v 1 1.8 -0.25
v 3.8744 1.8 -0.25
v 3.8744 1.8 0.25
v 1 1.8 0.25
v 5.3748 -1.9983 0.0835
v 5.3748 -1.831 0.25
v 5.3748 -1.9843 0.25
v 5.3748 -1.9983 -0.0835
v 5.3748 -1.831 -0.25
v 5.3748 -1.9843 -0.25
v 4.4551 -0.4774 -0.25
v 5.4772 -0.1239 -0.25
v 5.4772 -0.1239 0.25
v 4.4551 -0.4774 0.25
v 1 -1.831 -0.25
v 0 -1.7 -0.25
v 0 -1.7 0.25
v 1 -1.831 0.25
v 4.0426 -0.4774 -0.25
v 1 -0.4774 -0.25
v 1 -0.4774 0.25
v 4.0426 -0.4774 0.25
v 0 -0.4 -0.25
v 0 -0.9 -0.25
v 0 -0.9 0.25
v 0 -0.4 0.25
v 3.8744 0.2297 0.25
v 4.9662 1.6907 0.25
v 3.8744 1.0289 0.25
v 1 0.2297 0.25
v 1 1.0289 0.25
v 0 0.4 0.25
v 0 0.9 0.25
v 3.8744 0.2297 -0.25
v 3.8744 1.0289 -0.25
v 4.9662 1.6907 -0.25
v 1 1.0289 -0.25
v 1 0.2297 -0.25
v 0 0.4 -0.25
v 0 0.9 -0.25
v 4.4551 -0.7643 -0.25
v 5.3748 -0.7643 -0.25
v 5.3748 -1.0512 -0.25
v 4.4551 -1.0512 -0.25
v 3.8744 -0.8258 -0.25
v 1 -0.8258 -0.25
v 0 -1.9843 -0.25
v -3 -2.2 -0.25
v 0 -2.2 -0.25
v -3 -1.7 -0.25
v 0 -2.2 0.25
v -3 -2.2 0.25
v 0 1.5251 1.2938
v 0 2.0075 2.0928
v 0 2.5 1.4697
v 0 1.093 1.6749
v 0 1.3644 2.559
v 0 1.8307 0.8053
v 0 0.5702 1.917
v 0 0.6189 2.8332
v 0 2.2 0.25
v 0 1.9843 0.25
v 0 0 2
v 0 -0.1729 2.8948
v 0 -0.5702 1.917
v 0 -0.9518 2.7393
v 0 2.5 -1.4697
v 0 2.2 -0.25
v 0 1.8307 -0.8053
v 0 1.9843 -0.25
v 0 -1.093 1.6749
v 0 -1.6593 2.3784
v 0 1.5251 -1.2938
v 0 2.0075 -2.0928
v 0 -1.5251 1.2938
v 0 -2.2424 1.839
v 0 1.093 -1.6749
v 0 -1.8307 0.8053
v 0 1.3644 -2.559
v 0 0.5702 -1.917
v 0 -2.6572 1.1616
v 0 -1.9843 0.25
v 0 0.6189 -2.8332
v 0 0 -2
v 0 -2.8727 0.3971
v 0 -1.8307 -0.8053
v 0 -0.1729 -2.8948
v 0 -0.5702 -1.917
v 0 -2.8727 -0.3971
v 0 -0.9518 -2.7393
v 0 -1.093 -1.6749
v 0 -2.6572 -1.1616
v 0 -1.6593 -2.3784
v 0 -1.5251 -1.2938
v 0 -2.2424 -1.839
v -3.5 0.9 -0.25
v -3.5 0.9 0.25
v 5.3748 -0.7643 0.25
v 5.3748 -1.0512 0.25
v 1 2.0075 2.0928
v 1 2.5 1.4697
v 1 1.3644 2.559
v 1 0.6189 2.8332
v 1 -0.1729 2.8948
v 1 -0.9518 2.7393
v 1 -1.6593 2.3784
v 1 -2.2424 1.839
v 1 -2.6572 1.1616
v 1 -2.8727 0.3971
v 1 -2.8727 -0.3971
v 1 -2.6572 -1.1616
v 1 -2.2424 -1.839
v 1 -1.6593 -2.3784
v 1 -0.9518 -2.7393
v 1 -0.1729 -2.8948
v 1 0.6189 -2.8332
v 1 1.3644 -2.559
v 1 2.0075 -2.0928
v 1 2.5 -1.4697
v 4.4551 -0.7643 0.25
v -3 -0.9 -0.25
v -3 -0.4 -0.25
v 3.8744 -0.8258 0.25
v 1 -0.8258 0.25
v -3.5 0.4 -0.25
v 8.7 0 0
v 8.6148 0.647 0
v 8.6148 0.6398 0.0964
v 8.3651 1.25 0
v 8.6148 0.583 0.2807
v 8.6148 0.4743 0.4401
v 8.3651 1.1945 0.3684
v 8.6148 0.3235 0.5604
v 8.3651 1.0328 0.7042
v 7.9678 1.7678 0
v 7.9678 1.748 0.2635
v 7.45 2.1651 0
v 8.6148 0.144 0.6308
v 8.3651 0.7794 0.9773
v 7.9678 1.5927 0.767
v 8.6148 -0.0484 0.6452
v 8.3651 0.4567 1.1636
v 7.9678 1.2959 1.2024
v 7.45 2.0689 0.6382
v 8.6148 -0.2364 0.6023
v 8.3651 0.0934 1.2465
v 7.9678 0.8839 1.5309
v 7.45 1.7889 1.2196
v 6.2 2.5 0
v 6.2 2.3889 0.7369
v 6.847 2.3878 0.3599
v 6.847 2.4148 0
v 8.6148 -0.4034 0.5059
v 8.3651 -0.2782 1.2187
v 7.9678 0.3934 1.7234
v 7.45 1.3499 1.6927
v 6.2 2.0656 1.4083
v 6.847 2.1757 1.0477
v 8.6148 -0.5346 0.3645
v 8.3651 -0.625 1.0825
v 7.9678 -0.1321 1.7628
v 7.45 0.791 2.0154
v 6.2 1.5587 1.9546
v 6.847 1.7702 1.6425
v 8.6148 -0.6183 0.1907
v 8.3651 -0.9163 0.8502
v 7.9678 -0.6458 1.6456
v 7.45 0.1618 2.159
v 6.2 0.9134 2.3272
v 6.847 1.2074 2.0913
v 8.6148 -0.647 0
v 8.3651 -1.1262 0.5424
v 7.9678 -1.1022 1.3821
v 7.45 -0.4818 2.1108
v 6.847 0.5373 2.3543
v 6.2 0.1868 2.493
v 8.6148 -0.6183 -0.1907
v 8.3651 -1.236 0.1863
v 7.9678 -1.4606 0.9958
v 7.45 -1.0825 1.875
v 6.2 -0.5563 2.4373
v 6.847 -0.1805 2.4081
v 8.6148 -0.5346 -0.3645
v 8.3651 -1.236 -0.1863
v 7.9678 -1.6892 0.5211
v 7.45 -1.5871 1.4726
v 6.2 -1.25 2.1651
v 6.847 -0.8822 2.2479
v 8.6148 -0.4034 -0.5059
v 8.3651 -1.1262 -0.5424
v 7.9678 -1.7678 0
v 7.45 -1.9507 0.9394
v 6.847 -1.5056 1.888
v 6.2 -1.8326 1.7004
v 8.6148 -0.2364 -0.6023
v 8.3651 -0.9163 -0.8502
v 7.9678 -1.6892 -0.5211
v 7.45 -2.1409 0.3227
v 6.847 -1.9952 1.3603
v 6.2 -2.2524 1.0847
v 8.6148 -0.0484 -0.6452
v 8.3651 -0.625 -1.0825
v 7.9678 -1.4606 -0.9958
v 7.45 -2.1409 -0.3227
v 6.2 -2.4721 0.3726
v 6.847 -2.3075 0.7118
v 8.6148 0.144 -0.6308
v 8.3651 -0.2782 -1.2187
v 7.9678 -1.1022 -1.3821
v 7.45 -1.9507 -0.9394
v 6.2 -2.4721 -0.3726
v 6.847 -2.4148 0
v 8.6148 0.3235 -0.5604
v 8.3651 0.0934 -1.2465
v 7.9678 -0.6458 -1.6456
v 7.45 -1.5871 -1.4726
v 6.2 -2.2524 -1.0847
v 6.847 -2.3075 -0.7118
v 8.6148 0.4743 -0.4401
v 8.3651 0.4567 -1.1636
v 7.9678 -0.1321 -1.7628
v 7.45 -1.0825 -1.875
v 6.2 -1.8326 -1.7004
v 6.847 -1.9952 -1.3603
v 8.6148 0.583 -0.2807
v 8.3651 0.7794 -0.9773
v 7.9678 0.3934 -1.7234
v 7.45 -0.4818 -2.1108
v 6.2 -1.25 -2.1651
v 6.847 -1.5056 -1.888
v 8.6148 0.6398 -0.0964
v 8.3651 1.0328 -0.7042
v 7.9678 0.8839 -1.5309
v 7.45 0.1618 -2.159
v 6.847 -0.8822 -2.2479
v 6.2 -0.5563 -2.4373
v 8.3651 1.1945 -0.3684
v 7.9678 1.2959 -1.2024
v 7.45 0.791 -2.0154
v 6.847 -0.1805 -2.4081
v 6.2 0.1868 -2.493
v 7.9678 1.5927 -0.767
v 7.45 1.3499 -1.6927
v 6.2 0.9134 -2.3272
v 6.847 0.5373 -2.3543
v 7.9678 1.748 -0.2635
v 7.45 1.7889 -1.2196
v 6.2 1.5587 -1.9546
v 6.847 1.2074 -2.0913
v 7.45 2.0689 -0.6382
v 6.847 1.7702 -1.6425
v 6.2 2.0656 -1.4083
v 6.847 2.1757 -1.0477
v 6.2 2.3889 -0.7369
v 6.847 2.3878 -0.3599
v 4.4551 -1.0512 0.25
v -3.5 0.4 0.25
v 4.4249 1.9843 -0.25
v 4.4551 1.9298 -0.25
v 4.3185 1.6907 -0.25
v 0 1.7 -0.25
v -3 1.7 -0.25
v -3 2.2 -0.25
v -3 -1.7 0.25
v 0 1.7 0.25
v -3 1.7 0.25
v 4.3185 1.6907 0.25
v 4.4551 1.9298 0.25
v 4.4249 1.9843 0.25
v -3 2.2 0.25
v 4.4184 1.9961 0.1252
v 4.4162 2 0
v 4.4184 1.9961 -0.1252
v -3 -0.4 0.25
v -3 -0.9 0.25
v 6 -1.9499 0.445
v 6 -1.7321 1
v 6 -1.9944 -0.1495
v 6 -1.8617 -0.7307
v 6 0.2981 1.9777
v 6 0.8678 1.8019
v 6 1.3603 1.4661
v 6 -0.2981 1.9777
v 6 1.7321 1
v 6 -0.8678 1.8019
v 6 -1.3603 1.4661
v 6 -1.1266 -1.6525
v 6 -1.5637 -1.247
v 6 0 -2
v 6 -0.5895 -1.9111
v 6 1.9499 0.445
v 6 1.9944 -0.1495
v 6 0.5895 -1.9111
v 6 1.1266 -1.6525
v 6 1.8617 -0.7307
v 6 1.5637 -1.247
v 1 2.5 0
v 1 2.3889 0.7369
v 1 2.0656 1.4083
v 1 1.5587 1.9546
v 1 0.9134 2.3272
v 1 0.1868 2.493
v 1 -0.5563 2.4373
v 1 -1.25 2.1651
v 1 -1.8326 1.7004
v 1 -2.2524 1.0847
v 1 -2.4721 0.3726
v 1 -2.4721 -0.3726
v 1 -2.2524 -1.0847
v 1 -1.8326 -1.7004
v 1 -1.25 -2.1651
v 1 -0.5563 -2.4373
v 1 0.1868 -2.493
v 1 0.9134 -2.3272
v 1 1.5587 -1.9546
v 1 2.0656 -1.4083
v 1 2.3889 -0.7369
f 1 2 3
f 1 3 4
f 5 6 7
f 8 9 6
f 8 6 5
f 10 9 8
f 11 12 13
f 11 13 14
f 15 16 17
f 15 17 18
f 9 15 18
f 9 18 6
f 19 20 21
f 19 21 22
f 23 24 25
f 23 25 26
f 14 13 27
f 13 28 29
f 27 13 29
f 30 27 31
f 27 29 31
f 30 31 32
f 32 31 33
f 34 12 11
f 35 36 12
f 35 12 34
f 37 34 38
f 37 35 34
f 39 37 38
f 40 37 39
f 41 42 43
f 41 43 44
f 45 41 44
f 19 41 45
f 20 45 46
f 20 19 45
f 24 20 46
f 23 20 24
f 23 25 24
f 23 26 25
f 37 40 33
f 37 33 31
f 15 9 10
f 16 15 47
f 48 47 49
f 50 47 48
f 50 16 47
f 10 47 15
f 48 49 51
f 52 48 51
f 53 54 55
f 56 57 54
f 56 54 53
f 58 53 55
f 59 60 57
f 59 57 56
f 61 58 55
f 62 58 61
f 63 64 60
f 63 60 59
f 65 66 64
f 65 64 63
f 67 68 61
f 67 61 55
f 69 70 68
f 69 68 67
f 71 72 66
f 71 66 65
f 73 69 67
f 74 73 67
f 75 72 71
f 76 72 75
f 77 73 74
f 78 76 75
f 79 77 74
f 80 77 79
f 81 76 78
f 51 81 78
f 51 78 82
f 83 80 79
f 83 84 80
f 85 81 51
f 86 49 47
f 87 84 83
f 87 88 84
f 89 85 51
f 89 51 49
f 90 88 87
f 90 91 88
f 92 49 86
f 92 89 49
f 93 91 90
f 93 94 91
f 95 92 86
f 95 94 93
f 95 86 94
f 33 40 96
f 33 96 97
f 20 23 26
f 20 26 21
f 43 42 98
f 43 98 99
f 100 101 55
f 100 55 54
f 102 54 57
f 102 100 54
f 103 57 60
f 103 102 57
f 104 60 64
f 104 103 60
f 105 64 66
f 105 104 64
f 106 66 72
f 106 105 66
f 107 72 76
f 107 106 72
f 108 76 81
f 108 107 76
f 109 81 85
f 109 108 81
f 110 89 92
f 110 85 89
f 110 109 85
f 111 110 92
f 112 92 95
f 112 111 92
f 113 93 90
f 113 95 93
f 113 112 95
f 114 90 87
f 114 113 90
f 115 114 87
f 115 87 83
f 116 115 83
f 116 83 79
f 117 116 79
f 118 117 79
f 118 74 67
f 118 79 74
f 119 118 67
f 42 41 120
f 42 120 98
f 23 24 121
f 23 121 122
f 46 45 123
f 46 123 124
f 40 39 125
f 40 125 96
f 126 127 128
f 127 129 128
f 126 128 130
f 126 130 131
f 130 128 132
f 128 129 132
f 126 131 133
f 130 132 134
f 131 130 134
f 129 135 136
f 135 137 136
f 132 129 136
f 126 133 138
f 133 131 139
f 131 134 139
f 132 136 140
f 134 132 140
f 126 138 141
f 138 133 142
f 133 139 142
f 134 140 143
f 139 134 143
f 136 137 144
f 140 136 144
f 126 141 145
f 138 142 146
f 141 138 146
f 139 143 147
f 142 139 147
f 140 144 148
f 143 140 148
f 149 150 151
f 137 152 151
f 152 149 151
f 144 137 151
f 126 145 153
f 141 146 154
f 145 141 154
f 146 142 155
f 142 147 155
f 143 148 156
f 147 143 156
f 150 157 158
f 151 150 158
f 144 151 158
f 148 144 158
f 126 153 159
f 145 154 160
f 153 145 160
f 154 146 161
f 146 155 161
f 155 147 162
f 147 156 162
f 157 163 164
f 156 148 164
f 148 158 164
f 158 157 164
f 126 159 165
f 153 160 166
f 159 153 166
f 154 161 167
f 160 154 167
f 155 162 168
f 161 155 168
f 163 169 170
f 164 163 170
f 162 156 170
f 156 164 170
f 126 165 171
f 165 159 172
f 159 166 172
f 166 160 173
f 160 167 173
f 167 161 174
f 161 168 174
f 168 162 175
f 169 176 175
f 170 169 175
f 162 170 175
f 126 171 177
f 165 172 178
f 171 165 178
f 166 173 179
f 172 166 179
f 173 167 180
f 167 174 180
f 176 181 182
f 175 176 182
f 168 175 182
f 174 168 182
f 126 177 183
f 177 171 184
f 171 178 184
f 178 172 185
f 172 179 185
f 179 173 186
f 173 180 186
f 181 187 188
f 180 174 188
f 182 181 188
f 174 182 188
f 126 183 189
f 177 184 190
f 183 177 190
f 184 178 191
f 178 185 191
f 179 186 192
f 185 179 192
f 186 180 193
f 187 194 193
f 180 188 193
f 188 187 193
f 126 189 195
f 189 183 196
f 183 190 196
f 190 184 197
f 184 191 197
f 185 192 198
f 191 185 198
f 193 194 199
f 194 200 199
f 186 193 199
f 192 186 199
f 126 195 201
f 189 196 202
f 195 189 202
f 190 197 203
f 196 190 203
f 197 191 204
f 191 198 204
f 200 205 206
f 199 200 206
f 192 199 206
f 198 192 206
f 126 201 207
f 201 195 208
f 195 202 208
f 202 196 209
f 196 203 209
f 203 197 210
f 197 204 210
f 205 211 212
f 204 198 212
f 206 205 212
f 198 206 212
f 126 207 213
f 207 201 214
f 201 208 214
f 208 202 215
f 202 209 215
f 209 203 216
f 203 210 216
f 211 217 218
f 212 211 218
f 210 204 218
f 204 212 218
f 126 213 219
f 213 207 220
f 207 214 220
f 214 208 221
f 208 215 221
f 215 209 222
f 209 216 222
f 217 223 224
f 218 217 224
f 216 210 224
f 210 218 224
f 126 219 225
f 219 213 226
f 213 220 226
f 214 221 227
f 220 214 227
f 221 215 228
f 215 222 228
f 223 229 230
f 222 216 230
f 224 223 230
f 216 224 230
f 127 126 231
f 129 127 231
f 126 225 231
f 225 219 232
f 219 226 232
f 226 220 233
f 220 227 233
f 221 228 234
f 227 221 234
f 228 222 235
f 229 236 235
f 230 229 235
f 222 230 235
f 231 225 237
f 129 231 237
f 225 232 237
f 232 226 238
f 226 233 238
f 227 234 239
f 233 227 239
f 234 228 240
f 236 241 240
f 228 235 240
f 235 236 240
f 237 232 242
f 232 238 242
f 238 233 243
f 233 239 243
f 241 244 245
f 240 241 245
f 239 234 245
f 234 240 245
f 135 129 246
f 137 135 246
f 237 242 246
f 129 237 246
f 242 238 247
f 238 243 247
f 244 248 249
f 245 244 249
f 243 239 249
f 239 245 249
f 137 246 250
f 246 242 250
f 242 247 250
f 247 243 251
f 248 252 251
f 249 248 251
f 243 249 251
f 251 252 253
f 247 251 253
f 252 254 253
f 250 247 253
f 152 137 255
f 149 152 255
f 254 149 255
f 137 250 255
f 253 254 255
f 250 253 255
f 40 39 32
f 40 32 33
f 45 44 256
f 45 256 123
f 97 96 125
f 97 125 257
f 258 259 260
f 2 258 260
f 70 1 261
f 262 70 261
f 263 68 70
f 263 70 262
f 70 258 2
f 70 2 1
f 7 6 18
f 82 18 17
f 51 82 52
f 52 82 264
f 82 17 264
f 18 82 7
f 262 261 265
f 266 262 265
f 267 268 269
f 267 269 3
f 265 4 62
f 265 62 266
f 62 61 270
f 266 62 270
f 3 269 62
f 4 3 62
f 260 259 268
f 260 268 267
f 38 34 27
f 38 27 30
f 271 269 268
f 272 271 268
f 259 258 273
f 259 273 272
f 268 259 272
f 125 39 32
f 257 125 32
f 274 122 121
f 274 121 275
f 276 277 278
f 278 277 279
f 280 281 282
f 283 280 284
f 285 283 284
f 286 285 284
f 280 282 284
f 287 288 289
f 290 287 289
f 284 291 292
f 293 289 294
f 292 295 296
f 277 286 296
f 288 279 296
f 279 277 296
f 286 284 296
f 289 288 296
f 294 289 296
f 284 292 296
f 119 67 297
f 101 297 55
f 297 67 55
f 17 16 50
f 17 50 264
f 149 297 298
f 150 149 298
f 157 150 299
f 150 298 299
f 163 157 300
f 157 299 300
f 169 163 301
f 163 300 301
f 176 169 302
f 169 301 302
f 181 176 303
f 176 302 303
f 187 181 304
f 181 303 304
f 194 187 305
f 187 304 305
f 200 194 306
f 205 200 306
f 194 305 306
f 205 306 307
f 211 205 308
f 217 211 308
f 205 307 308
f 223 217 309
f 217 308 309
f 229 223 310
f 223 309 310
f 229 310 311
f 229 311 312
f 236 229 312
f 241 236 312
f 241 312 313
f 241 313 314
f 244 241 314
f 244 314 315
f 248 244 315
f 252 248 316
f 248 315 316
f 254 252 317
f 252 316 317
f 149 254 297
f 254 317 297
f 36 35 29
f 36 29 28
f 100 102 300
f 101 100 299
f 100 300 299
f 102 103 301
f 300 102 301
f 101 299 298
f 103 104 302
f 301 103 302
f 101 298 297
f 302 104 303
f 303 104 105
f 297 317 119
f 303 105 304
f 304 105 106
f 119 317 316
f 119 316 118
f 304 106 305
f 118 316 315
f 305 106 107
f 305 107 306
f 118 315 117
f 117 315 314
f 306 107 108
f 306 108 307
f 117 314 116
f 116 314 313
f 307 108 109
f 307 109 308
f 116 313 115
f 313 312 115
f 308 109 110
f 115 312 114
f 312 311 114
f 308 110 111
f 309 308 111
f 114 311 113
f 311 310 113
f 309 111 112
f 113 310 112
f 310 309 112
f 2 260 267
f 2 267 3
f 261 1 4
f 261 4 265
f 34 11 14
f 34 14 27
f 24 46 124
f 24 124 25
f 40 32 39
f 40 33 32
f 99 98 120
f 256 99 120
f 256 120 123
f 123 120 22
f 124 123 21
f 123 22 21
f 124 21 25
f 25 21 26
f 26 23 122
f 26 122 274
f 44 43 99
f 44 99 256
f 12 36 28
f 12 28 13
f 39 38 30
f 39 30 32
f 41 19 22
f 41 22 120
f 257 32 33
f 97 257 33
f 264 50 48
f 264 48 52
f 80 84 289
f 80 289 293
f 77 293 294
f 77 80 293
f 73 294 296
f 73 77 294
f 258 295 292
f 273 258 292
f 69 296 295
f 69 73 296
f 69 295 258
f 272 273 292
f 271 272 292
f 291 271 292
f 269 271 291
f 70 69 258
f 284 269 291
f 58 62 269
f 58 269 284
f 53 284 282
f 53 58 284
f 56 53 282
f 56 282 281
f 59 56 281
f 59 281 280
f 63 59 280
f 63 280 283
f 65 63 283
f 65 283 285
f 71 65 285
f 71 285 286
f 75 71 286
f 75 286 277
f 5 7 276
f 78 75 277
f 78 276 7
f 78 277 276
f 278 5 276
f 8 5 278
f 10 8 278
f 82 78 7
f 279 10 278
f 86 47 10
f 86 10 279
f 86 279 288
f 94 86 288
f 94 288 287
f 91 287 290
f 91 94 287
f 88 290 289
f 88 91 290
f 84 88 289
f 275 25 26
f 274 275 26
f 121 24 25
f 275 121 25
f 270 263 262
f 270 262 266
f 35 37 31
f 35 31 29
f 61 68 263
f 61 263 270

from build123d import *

# Parameters (mm, degrees)
SKETCH_3_W               = 1
SKETCH_3_H               = 2.9
CUT_EXTRUDE_1_DEPTH      = 10
SKETCH_5_W               = 0.5
SKETCH_5_H               = 0.5
EXTRUDE_1_DEPTH          = 3
SKETCH_5_3_W             = 0.5
SKETCH_5_3_H             = 0.5
EXTRUDE_2_DEPTH          = 3.5
CUT_EXTRUDE_2_DEPTH      = 5
CUT_EXTRUDE_2_DEPTH_BACK = 1
SKETCH_7_R               = 2
EXTRUDE_3_DEPTH          = 0.25
EXTRUDE_3_DEPTH_BACK     = 0.25


with BuildPart() as part:
    # 草图1 → 旋转1 (revolve)
    with BuildSketch(Plane.XY):
        with BuildLine():
            Line((0, 0), (8.7, 0))
            ThreePointArc((8.7, 0), (7.967766953, 1.767766953), (6.2, 2.5))
            Line((6.2, 2.5), (0, 2.5))
            Line((0, 2.5), (0, 0))
        make_face()
    revolve(axis=Axis((0, 0, 0), (1, 0, 0)))

    # 草图3 → 旋转2 (revolve)
    with BuildSketch(Plane.XY, mode=Mode.PRIVATE) as revolve_2_sk:
        with Locations((0.5, 1.45)):
            Rectangle(SKETCH_3_W, SKETCH_3_H)
    revolve(revolve_2_sk.sketch.rotate(Axis((0, 0, 0), (1, 0, 0)), 90), axis=Axis((0, 0, 0), (1, 0, 0)))

    # 草图4 → 切除-拉伸1 (cut)
    with BuildSketch(Plane.ZY):
        with BuildLine():
            Line((-1.469693846, 2.5), (1.469693846, 2.5))
            ThreePointArc((1.469693846, 2.5), (0, 2.9), (-1.469693846, 2.5))
        make_face()
    extrude(amount=-CUT_EXTRUDE_1_DEPTH, mode=Mode.SUBTRACT)

    # 草图5 → 凸台-拉伸1 (add)
    with BuildSketch(Plane.ZY):
        with Locations((0, 1.95)):
            Rectangle(SKETCH_5_W, SKETCH_5_H)
        with Locations((0, -0.65)):
            Rectangle(SKETCH_5_W, SKETCH_5_H)
        with Locations((0, -1.95)):
            Rectangle(SKETCH_5_W, SKETCH_5_H)
    extrude(amount=EXTRUDE_1_DEPTH)

    # 草图5<3> → 凸台-拉伸2 (add)
    with BuildSketch(Plane.ZY):
        with Locations((0, 0.65)):
            Rectangle(SKETCH_5_3_W, SKETCH_5_3_H)
    extrude(amount=EXTRUDE_2_DEPTH)

    # 草图7 → 切除-拉伸2 (cut, two sides: drawn at the far end of the back side and taken through both)
    with BuildSketch(Plane(origin=(1, 0, 0), x_dir=(0, 0, -1), z_dir=(1, 0, 0)).offset(-CUT_EXTRUDE_2_DEPTH_BACK)):
        Circle(SKETCH_7_R)
    extrude(amount=CUT_EXTRUDE_2_DEPTH + CUT_EXTRUDE_2_DEPTH_BACK, mode=Mode.SUBTRACT)


with BuildPart() as cut_extrude_2_piece_1:
    # of the separate pieces the step leaves, piece 1, a body of its own (cut_extrude_2_pieces)
    add(part.part.solids().sort_by_distance((8.7, 0, 0))[0])

    # 草图6 → 凸台-拉伸3 (add, two sides: drawn at the far end of the back side and taken through both)
    with BuildSketch(Plane.XY.offset(-EXTRUDE_3_DEPTH_BACK)):
        Polygon((1, 2.2), (3.977000914, 2.2), (4.190377097, 2.408020966), (4.455092421, 1.929825542), (4.318465157, 1.69072783), (3.874426549, 1.8), (1, 1.8), (0, 1.7), (0, 2.2), align=None)
        Polygon((1, 1.02893952), (3.874426549, 1.02893952), (4.96616378, 1.69072783), (5.47723514, -0.12385302), (4.455092421, -0.477376065), (3.874426549, 0.229670026), (1, 0.229670026), (0, 0.4), (0, 0.9), align=None)
        Polygon((1, -0.477376065), (4.042648868, -0.477376065), (4.455092421, -0.76429332), (5.374764692, -0.76429332), (5.374764692, -1.051210574), (4.455092421, -1.051210574), (3.874426549, -0.825775589), (1, -0.825775589), (0, -0.9), (0, -0.4), align=None)
        Polygon((1, -1.831047036), (5.374764692, -1.831047036), (5.374764692, -2.075012613), (1, -2.075012613), (0, -2.2), (0, -1.7), align=None)
    extrude(amount=EXTRUDE_3_DEPTH + EXTRUDE_3_DEPTH_BACK)


with BuildPart() as cut_extrude_2_piece_2:
    # of the separate pieces the step leaves, piece 2, a body of its own (cut_extrude_2_pieces)
    add(part.part.solids().sort_by_distance((0, 0.9, -0.25))[0])


with BuildPart() as cut_extrude_2_piece_3:
    # of the separate pieces the step leaves, piece 3, a body of its own (cut_extrude_2_pieces)
    add(part.part.solids().sort_by_distance((0, -0.4, -0.25))[0])


with BuildPart() as extrude_3_piece_1:
    # of the separate pieces the step leaves, piece 1, a body of its own (extrude_3_pieces)
    add(cut_extrude_2_piece_1.part.solids().sort_by_distance((8.7, 0, 0))[0])


with BuildPart() as extrude_3_piece_2:
    # of the separate pieces the step leaves, piece 2, a body of its own (extrude_3_pieces)
    add(cut_extrude_2_piece_1.part.solids().sort_by_distance((1, 1.02893952, 0.25))[0])


with BuildPart() as extrude_3_piece_3:
    # of the separate pieces the step leaves, piece 3, a body of its own (extrude_3_pieces)
    add(cut_extrude_2_piece_1.part.solids().sort_by_distance((1, -0.477376065, 0.25))[0])


solid = Compound([cut_extrude_2_piece_2.part, cut_extrude_2_piece_3.part, extrude_3_piece_1.part, extrude_3_piece_2.part, extrude_3_piece_3.part])
